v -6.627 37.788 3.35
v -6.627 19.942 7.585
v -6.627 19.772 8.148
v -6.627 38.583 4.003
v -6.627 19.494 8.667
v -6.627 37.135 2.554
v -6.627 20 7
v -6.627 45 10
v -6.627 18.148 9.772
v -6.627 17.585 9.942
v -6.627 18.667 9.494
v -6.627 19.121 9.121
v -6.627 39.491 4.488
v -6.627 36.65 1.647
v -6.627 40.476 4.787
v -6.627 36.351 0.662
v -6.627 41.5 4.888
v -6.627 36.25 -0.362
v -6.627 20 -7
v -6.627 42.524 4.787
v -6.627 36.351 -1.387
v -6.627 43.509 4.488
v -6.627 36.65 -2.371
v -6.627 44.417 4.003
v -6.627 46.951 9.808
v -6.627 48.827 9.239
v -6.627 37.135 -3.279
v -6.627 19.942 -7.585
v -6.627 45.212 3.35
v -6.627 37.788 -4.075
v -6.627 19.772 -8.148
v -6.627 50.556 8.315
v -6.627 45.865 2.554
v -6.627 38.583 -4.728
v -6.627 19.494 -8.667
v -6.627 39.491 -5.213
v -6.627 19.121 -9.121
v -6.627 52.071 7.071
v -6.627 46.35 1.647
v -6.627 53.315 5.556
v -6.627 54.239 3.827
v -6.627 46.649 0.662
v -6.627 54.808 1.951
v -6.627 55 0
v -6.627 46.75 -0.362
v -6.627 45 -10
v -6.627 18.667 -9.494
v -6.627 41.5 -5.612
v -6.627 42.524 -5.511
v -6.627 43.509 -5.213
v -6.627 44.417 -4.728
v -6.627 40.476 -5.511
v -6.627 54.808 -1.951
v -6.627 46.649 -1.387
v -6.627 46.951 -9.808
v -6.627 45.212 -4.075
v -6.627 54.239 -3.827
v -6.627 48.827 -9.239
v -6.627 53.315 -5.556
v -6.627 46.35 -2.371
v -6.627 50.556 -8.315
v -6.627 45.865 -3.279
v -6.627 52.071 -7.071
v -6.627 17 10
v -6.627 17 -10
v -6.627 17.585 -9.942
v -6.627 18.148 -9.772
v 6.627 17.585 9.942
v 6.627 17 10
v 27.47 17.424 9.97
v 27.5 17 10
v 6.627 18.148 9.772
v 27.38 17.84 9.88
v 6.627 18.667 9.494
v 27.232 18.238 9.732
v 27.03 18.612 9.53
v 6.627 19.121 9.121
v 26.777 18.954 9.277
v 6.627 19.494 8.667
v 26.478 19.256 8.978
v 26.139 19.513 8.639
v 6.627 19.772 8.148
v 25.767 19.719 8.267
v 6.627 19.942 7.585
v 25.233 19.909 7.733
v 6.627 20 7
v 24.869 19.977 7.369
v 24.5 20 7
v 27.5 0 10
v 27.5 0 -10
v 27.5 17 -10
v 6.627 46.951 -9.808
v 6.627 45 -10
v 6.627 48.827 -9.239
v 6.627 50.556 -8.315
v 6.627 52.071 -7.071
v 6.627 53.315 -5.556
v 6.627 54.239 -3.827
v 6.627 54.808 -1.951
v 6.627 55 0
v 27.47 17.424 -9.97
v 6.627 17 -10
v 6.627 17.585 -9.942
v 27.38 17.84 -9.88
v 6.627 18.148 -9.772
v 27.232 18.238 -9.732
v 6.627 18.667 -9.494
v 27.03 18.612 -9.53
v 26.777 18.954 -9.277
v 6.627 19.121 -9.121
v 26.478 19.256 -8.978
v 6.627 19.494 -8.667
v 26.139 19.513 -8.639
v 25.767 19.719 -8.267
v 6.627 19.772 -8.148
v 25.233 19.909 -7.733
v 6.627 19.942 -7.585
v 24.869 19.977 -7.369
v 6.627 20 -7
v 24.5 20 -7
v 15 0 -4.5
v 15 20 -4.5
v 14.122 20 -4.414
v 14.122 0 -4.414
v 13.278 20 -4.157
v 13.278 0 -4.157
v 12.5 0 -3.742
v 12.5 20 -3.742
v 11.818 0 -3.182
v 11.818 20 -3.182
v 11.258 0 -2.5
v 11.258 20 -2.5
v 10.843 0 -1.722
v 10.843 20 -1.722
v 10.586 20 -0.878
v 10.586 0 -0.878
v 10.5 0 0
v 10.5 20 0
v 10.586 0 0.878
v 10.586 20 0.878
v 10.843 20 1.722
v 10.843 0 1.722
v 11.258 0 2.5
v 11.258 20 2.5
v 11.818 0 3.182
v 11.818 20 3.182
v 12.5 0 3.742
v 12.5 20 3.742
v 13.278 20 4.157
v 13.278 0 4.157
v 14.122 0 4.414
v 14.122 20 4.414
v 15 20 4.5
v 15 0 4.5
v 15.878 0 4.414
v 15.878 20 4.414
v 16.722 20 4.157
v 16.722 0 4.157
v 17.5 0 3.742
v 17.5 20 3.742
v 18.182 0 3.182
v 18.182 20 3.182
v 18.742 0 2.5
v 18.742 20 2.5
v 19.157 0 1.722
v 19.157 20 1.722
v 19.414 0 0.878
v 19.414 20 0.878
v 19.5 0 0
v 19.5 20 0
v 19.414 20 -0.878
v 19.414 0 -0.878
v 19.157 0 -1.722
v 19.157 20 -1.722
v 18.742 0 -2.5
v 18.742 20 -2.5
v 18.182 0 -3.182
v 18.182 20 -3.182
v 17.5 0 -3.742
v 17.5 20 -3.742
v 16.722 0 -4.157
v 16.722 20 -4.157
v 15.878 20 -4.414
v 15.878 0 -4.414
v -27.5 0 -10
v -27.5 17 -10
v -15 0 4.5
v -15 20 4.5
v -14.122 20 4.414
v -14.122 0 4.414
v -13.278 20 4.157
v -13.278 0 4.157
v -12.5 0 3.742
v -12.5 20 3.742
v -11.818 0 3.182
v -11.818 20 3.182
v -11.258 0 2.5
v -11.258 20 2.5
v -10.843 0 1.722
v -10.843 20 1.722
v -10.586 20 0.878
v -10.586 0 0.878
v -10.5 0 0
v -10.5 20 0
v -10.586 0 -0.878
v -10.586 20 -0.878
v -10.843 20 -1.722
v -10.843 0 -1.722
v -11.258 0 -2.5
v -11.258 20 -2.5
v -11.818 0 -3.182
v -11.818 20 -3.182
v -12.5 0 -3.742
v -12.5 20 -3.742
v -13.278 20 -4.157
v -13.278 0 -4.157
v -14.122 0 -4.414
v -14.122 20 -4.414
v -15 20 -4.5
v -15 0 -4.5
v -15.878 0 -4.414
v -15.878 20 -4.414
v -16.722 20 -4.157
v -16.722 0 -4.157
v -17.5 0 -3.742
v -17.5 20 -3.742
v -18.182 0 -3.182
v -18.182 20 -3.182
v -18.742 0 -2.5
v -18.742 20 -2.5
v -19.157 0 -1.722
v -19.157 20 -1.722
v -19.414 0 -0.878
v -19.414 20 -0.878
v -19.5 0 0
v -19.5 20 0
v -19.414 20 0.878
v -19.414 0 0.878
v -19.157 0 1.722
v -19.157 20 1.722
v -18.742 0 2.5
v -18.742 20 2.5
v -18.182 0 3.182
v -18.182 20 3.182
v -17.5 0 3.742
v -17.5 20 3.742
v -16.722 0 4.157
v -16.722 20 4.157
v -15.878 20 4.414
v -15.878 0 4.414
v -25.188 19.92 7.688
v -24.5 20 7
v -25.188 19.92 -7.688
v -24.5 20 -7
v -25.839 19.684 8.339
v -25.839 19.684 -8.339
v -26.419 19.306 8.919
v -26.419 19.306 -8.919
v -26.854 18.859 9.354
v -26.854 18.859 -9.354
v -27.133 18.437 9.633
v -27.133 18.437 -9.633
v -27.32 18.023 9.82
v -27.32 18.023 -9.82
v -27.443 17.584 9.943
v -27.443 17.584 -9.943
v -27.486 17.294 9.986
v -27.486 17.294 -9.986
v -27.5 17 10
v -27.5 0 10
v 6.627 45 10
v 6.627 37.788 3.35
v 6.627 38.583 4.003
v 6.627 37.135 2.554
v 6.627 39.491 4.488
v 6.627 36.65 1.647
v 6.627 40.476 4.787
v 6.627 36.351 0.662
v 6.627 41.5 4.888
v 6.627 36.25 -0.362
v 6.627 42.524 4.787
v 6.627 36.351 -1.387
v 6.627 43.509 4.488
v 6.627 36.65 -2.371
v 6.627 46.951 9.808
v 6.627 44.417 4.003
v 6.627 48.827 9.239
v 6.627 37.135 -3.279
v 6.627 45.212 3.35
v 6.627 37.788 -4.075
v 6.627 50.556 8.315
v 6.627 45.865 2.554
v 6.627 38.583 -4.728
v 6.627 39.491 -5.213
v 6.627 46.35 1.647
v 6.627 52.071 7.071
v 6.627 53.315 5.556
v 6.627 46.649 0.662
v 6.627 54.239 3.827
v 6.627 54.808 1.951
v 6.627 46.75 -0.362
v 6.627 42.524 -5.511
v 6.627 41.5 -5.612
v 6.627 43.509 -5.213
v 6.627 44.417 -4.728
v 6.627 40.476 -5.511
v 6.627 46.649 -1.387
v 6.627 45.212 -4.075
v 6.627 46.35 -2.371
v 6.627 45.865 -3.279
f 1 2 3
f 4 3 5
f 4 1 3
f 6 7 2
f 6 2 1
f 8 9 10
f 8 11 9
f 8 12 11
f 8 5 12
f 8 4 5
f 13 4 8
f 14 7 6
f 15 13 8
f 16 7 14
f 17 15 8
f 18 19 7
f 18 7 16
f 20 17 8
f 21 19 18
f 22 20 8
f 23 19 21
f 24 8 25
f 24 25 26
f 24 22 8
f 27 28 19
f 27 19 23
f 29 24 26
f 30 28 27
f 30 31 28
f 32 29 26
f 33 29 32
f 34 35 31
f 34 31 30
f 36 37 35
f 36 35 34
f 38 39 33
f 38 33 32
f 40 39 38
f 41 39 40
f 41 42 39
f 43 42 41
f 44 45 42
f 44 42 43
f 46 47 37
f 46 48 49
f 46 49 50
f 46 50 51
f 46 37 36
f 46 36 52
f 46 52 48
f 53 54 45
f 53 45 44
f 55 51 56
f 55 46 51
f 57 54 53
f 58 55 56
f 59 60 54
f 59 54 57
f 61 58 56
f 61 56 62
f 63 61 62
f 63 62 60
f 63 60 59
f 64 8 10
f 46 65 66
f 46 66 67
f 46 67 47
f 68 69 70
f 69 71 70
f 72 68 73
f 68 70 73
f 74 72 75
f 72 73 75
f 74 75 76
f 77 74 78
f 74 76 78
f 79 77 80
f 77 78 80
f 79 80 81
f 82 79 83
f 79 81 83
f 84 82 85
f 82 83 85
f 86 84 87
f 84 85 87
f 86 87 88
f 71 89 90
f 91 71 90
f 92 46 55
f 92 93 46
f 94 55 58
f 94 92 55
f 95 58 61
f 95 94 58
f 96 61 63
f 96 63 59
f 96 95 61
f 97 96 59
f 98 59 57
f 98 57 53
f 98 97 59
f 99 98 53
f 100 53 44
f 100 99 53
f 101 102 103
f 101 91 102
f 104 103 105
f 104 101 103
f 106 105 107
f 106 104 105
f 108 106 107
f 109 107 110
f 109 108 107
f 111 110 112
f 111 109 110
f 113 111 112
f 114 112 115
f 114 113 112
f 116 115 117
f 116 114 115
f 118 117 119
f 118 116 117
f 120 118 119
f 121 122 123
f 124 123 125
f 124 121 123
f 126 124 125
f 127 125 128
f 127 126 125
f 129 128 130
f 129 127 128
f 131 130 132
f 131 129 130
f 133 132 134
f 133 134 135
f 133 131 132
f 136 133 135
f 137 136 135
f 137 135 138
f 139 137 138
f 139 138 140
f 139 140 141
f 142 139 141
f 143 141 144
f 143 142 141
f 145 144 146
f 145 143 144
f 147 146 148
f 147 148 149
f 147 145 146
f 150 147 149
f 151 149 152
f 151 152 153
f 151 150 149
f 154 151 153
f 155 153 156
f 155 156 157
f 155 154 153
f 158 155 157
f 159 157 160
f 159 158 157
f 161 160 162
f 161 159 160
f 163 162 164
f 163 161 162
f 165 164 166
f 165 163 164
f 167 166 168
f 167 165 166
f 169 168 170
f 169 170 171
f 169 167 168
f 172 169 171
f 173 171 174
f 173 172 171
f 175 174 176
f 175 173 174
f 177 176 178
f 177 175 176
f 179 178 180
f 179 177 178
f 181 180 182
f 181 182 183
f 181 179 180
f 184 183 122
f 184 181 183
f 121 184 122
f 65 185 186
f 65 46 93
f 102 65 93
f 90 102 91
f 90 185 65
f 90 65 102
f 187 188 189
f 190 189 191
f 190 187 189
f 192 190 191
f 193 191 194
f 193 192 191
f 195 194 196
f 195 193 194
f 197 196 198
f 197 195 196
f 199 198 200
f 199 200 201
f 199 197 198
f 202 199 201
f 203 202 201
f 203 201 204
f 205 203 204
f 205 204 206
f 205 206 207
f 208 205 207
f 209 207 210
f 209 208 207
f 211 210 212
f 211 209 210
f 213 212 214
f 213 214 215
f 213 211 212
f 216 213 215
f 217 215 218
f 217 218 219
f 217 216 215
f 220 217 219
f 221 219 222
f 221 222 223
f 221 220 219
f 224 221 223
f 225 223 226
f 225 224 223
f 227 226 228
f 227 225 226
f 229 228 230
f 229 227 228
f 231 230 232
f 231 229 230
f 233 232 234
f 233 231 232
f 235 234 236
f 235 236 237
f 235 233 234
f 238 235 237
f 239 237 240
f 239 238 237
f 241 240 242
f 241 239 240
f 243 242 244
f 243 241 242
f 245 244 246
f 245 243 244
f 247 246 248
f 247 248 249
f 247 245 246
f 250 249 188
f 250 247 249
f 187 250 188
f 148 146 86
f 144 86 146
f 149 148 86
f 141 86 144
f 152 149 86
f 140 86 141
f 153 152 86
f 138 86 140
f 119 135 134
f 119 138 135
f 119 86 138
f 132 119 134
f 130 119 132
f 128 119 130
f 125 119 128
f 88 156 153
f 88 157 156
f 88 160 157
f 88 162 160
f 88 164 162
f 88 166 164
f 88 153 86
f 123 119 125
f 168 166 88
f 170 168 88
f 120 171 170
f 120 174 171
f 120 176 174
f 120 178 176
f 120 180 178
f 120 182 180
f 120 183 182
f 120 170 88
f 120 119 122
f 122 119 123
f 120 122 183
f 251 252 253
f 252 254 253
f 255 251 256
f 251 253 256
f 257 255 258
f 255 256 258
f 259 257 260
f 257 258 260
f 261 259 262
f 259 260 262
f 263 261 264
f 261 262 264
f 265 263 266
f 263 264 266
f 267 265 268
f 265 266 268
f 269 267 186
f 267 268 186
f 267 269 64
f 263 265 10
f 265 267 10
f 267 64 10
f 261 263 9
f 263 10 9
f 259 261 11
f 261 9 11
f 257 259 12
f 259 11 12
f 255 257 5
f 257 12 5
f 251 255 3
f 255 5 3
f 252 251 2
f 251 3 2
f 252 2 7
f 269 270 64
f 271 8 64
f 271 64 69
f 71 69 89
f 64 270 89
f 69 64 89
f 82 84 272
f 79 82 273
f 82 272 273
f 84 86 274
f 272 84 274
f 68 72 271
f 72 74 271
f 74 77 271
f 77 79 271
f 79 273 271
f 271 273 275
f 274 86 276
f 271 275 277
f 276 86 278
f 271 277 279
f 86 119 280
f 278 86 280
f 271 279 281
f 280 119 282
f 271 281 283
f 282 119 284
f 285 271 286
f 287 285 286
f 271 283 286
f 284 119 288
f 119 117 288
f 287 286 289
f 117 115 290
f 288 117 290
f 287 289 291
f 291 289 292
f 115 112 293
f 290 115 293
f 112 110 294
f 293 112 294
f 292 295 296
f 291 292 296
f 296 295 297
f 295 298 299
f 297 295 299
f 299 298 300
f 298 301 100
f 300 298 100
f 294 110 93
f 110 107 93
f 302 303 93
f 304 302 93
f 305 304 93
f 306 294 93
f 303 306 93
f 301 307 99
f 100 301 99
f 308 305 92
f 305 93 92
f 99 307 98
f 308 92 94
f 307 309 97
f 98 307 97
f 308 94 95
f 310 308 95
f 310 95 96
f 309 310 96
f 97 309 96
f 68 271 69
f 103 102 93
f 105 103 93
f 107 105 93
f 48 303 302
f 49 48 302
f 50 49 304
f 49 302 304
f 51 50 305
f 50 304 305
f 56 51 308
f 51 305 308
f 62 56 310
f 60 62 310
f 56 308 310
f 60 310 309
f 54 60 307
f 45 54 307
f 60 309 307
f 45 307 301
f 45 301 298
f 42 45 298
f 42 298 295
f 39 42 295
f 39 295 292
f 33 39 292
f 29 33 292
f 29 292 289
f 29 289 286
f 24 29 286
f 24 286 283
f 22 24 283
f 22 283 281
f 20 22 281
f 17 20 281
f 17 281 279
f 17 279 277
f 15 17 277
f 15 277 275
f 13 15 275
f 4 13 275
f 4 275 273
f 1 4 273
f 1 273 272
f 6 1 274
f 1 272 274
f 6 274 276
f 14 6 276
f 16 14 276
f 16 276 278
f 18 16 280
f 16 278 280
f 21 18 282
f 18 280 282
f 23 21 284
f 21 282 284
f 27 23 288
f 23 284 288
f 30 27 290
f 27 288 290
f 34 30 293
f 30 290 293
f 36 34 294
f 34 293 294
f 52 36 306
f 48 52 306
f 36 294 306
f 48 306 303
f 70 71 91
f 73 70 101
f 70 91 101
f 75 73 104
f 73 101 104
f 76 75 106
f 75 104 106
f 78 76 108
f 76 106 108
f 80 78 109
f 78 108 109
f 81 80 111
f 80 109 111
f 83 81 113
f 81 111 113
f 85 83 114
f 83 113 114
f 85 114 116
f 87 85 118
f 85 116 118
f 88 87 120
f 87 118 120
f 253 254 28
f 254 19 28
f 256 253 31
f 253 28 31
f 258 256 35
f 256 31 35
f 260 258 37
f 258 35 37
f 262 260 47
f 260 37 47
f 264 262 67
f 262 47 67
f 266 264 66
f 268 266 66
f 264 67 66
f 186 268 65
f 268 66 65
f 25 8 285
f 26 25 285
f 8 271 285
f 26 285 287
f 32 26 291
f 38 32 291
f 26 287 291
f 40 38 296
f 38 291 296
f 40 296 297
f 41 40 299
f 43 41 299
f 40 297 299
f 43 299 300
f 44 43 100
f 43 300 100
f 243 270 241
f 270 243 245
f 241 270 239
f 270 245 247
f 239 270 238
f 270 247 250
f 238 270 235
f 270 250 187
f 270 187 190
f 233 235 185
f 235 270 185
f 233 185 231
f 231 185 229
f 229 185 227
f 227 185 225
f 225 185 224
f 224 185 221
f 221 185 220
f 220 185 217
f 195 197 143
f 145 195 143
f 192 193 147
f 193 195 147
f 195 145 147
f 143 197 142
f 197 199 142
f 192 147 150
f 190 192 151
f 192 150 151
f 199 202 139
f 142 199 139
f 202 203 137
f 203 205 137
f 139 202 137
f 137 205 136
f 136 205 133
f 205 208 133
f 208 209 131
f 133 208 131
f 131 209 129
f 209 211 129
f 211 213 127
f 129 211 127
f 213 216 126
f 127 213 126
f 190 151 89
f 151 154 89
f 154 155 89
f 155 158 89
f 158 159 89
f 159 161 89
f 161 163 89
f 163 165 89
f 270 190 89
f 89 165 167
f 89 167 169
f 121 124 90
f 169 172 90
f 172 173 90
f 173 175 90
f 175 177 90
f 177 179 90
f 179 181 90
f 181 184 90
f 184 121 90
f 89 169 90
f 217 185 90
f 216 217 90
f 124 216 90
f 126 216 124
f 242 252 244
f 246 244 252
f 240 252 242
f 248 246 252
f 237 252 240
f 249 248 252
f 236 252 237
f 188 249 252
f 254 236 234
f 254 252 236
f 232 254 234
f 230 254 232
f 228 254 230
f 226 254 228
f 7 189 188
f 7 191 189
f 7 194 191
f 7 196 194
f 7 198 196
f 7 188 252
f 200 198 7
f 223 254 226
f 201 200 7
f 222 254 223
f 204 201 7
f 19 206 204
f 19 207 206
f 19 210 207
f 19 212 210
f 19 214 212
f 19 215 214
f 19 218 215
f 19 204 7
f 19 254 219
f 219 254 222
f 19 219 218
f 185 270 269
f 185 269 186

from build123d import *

# Parameters (mm, degrees)
SKETCH_1_W          = 55
SKETCH_1_H          = 20
SKETCH_1_R          = 4.5
EXTRUDE_1_DEPTH     = 20
EXTRUDE_START       = -10
EXTRUDE_2_OUTLINE_W = 13.25368731
EXTRUDE_2_OUTLINE_H = 35
EXTRUDE_2_DEPTH     = 20
SKETCH_3_R          = 5.25
CUT_EXTRUDE_1_DEPTH = 30
FILLET1_R           = 10
FILLET2_R           = 3
FILLET3_R           = 3


# Read off the part's stored shape, not the designer's step: 填料-伸長2
with BuildPart() as part:
    # 草圖1 → 填料-伸長1 (new body)
    with BuildSketch(Plane(origin=(0, 0, 0), x_dir=(1, 0, 0), z_dir=(0, 1, 0))):
        Rectangle(SKETCH_1_W, SKETCH_1_H)
        with Locations(Location((-15, 0, 0), (0, 0, 270))):
            Circle(SKETCH_1_R, mode=Mode.SUBTRACT)
        with Locations(Location((15, 0, 0), (0, 0, 90))):
            Circle(SKETCH_1_R, mode=Mode.SUBTRACT)
    extrude(amount=EXTRUDE_1_DEPTH)

    # 填料-伸長2 outline → 填料-伸長2 (add)
    with BuildSketch(Plane.XY.offset(EXTRUDE_START)):
        with Locations((0, 37.5)):
            Rectangle(EXTRUDE_2_OUTLINE_W, EXTRUDE_2_OUTLINE_H)
    extrude(amount=EXTRUDE_2_DEPTH)

    # 草圖3 → 除料-伸長1 (cut)
    with BuildSketch(Plane(origin=(6.626843655, 0, 0), x_dir=(0, 0, -1), z_dir=(1, 0, 0))):
        with Locations((0.362292653, 41.5)):
            Circle(SKETCH_3_R)
    extrude(amount=-CUT_EXTRUDE_1_DEPTH, mode=Mode.SUBTRACT)

    # Fillet1
    fillet1_edges = [part.edges().sort_by_distance(p)[0] for p in [
        (0, 55, -10),
        (0, 55, 10),
    ]]
    fillet(fillet1_edges, radius=FILLET1_R - 0.0001)  # a hair under: the kernel refuses the full size

    # Fillet2
    fillet2_edges = [part.edges().sort_by_distance(p)[0] for p in [
        (-27.5, 20, 0),
        (-17.063421827, 20, 10),
        (-17.063421827, 20, -10),
    ]]
    fillet(fillet2_edges, radius=FILLET2_R)

    # Fillet3
    fillet3_edges = [part.edges().sort_by_distance(p)[0] for p in [
        (17.063421827, 20, 10),
        (27.5, 20, 0),
        (17.063421828, 20, -10),
    ]]
    fillet(fillet3_edges, radius=FILLET3_R)


solid = part.part
